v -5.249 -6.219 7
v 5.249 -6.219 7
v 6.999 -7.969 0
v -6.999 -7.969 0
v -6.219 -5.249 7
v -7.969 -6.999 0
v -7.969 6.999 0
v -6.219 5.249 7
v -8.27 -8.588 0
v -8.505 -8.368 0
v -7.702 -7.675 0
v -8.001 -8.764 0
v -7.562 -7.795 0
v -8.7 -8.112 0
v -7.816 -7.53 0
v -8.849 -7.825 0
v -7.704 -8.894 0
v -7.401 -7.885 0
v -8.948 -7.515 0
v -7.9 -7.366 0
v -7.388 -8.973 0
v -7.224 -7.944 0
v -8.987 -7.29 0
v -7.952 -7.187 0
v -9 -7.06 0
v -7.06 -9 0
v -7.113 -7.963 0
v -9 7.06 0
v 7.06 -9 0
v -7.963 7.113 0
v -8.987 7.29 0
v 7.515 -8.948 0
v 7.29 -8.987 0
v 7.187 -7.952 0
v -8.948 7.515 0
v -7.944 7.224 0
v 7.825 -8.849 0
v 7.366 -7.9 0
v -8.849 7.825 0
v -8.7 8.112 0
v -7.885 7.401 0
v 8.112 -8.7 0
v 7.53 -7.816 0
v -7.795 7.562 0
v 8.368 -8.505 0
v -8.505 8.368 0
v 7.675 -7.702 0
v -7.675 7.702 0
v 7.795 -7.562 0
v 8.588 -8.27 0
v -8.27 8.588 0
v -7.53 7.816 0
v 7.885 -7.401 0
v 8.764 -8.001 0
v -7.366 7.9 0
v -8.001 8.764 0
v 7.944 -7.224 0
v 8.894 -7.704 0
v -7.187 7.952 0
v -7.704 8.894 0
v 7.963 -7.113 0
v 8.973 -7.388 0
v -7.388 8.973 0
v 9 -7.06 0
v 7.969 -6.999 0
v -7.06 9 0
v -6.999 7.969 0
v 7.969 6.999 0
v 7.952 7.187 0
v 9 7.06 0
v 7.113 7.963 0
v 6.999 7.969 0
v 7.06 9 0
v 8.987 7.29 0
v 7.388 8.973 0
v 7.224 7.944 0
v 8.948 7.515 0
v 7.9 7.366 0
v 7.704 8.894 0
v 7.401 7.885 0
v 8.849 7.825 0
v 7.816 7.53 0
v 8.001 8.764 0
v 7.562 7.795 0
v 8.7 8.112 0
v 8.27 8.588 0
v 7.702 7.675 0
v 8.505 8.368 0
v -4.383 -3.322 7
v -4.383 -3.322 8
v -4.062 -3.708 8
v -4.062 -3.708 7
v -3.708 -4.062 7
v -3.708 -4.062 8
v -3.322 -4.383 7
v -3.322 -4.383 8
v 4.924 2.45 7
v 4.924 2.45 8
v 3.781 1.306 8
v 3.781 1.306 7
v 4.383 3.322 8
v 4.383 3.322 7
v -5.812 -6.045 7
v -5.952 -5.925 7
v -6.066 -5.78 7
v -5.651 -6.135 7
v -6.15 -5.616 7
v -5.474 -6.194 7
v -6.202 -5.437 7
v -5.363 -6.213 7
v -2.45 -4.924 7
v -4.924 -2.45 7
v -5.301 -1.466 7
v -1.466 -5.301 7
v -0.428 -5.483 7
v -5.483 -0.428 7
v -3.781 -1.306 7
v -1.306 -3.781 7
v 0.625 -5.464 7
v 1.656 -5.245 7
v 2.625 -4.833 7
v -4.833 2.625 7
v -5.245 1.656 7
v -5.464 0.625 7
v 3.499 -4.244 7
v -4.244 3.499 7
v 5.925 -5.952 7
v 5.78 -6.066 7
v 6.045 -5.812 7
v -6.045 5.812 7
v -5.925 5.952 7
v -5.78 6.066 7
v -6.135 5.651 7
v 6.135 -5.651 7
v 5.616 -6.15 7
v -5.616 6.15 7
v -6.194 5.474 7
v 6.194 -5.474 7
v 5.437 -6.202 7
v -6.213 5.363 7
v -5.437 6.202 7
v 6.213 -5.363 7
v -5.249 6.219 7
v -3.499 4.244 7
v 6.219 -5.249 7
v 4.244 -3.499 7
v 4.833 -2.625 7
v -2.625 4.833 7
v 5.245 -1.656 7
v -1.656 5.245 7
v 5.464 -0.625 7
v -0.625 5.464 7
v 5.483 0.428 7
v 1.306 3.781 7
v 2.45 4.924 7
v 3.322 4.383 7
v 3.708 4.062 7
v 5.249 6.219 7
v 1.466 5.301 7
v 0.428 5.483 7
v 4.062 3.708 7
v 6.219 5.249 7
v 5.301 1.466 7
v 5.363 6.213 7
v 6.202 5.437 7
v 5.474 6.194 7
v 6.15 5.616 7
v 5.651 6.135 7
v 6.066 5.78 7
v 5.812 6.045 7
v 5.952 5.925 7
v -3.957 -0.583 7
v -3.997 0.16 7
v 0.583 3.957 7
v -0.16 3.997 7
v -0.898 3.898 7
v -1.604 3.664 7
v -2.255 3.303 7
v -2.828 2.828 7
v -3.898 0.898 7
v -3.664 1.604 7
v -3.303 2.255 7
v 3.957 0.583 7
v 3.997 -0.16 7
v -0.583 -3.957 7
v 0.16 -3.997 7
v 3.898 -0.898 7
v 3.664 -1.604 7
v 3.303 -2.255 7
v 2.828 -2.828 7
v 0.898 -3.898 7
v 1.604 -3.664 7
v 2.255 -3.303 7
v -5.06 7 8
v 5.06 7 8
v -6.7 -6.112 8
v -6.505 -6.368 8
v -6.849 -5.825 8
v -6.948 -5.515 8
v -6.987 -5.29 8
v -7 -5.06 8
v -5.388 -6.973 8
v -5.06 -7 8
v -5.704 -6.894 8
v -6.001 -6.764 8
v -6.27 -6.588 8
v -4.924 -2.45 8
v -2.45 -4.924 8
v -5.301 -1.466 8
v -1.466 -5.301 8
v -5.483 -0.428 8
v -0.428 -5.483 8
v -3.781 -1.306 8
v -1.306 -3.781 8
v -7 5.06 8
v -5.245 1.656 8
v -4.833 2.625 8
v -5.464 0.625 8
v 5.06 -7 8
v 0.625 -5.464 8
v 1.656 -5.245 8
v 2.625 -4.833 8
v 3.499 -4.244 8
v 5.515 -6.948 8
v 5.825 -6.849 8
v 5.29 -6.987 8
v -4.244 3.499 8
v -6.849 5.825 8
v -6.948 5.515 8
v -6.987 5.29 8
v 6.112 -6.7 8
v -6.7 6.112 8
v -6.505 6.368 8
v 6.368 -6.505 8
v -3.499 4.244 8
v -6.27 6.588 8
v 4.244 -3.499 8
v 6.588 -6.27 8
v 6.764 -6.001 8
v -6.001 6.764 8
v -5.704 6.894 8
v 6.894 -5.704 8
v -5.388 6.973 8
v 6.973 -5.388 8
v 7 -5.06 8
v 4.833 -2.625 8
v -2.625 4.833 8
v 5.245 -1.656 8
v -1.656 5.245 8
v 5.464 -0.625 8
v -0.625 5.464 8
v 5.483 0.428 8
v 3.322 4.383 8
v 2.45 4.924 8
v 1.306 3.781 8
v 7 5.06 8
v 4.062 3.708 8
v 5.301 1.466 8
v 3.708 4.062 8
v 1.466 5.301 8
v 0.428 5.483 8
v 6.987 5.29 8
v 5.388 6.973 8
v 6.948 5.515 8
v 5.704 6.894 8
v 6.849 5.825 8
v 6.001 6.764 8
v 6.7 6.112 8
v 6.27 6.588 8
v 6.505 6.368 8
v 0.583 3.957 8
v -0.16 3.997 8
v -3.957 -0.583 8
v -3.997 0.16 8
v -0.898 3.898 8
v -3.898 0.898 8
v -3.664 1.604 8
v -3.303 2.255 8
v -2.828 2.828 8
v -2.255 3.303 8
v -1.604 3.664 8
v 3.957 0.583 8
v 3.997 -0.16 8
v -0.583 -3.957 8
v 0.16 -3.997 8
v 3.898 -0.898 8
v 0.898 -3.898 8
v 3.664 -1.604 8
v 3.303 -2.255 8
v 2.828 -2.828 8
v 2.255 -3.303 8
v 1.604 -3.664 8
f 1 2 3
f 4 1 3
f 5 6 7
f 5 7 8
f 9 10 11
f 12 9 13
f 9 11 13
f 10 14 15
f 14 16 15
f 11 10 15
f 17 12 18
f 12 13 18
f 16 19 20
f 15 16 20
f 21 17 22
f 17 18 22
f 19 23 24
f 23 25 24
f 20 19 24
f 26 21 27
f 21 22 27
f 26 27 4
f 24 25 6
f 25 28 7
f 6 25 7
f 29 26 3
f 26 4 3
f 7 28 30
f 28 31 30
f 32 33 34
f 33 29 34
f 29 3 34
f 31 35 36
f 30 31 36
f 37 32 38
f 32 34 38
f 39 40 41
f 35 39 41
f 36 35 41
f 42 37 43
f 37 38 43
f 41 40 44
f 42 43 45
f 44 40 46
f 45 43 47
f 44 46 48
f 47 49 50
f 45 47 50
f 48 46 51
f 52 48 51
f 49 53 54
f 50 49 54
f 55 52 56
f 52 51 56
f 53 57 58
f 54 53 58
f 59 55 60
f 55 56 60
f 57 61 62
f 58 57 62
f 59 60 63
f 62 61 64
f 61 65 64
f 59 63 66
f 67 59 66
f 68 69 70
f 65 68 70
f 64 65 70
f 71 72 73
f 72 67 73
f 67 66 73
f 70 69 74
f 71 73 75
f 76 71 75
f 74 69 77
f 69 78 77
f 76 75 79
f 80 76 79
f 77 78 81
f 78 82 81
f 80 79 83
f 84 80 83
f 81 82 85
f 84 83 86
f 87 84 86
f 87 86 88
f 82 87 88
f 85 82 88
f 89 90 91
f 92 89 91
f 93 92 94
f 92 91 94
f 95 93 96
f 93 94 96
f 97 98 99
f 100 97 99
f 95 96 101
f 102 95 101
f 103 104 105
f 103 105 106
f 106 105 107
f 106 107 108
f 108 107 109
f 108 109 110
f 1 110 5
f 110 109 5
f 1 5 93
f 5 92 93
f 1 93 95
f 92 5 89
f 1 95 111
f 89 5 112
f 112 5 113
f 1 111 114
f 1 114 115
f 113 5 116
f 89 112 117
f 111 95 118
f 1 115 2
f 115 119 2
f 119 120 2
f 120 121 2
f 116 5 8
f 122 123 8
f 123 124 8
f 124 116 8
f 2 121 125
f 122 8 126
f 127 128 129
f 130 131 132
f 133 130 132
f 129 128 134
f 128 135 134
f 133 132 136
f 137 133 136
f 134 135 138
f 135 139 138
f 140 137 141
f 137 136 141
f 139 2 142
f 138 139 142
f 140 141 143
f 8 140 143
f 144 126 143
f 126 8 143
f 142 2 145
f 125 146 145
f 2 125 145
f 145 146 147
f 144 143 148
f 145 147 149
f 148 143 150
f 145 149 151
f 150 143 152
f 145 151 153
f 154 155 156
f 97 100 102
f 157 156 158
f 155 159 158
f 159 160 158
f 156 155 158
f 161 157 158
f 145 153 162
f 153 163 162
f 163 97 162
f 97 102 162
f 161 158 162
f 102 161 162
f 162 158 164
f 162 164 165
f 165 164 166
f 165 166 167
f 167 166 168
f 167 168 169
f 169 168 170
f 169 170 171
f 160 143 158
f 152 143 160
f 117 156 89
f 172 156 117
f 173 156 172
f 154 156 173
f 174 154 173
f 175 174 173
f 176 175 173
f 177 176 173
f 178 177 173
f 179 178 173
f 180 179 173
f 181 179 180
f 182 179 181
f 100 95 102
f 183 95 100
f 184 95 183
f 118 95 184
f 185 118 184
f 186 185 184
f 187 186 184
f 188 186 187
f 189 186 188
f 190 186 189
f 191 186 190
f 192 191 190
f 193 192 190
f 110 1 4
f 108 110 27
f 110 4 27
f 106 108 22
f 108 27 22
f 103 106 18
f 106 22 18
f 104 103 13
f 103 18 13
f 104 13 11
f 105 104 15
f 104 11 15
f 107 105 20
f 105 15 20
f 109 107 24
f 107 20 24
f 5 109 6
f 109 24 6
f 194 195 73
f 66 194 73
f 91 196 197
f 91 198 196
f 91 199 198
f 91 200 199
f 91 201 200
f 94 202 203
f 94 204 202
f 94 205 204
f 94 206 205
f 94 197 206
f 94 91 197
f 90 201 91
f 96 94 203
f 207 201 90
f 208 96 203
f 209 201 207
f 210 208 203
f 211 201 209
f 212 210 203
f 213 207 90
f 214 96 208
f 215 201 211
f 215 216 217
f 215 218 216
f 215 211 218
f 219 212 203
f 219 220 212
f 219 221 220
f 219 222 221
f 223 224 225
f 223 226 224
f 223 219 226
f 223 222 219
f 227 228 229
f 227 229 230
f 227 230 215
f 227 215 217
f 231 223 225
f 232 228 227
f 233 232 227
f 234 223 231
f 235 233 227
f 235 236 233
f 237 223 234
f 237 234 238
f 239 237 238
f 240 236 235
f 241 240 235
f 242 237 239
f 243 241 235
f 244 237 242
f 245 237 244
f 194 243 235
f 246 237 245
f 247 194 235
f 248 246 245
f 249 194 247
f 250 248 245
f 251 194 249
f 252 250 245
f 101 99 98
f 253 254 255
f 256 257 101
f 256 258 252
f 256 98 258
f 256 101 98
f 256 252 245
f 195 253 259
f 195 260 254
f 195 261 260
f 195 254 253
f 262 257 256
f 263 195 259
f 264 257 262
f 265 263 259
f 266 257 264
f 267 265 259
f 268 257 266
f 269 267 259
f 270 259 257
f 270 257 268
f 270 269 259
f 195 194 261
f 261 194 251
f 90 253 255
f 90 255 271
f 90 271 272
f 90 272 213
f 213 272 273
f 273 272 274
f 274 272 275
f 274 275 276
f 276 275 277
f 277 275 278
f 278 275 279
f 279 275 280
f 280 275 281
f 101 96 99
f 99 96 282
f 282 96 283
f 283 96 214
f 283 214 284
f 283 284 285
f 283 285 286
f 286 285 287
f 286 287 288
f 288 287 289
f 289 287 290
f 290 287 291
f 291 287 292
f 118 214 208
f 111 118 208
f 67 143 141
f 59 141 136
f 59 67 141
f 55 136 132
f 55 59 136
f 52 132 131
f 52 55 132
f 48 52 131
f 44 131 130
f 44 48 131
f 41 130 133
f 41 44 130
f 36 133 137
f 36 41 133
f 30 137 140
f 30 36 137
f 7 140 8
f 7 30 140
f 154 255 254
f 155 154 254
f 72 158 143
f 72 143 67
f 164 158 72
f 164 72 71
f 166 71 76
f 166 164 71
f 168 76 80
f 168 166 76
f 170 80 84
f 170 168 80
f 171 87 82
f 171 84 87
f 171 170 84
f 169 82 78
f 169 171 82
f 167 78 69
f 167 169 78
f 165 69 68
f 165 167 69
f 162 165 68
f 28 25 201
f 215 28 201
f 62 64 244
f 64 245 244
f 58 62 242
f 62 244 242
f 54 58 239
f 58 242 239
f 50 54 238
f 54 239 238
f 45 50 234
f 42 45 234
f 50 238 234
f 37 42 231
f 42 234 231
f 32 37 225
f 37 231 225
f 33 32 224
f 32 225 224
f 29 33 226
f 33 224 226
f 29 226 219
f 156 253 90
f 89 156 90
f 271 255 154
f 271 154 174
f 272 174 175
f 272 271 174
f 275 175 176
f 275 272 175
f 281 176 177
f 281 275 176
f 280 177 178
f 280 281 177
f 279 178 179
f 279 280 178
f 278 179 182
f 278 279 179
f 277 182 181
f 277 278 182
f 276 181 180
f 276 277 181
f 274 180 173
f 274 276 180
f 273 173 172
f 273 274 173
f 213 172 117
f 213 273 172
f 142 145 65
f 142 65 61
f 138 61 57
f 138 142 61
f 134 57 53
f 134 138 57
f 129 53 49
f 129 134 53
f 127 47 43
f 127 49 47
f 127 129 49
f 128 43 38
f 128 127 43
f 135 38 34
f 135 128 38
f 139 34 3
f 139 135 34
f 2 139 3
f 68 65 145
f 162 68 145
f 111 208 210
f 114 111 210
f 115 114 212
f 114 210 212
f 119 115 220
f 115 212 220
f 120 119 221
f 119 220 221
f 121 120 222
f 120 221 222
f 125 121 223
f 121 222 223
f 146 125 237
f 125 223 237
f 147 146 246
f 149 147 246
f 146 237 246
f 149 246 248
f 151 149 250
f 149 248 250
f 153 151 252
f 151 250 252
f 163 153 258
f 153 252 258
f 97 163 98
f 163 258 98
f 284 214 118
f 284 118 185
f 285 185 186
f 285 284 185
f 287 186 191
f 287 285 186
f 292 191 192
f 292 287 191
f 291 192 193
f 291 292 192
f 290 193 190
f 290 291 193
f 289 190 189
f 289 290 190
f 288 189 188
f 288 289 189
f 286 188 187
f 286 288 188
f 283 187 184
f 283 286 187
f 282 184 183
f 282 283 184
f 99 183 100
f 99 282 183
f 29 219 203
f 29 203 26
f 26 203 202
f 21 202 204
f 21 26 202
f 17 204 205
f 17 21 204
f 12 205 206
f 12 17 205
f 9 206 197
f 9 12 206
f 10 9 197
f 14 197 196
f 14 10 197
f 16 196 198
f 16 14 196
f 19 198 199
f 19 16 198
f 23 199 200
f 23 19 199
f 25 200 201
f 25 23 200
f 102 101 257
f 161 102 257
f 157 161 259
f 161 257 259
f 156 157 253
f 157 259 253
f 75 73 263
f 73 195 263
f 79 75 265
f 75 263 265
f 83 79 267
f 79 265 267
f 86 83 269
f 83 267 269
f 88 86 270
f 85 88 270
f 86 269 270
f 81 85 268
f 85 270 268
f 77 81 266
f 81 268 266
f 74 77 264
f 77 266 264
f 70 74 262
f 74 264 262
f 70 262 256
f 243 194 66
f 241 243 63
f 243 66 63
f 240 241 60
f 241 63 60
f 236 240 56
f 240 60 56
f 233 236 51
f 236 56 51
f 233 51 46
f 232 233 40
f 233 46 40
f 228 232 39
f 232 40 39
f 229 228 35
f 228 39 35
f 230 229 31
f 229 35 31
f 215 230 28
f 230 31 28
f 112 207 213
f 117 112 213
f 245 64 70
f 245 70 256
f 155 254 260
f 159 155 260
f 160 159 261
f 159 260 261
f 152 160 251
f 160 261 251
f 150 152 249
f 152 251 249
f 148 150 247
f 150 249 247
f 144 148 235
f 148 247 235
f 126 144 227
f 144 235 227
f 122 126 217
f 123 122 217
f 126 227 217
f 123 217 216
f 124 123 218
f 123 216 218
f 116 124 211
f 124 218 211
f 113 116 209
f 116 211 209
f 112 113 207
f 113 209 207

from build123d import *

# Parameters (mm, degrees)
SKETCH_W             = 18
SKETCH_H             = 18
PAD_DEPTH            = 8
POCKET_DEPTH         = 18.001
POCKET001_DEPTH      = 9.001
POCKET001_DEPTH_BACK = 9.001
FILLET_R             = 2
THICKNESS_T          = -1
POCKET002_DEPTH      = 1


with BuildPart() as part:
    # Sketch → Pad (new body)
    with BuildSketch(Plane.XY):
        Rectangle(SKETCH_W, SKETCH_H)
    extrude(amount=PAD_DEPTH)

    # Sketch001 (on Face1 of Pad) → Pocket (cut, through all)
    with BuildSketch(Plane.XZ.offset(9)):
        Polygon((-9, 8), (-9, 0), (-7, 8), align=None)
        Polygon((9, 8), (9, 0), (7, 8), align=None)
    extrude(amount=-POCKET_DEPTH, mode=Mode.SUBTRACT)

    # Sketch002 → Pocket001 (cut, two sides)
    with BuildSketch(Plane.YZ) as pocket001_sk:
        Polygon((-9, 8), (-7, 8), (-9, 0), align=None)
        Polygon((9, 8), (7, 8), (9, 0), align=None)
    extrude(amount=-POCKET001_DEPTH, mode=Mode.SUBTRACT)
    extrude(pocket001_sk.sketch, amount=POCKET001_DEPTH_BACK, mode=Mode.SUBTRACT)

    # Fillet
    fillet_edges = [part.edges().sort_by_distance(p)[0] for p in [
        (-8, 8, 4),
        (-8, -8, 4),
        (8, -8, 4),
        (8, 8, 4),
    ]]
    fillet(fillet_edges, radius=FILLET_R)

    # Thickness
    thickness_openings = [part.faces().sort_by_distance(p)[0] for p in [
        (0, 0, 0),
    ]]
    offset(amount=THICKNESS_T, openings=thickness_openings, kind=Kind.INTERSECTION)

    # Sketch003 (on Face9 of Thickness) → Pocket002 (cut)
    with BuildSketch(Plane.XY.offset(8)):
        with BuildLine():
            ThreePointArc((-4.383089, -3.322429), (-3.889087, -3.889087), (-3.322429, -4.383089))
            Line((-3.322429, -4.383089), (4.383089, 3.322429))
            ThreePointArc((4.383089, 3.322429), (3.889087, 3.889087), (3.322429, 4.383089))
            Line((3.322429, 4.383089), (-4.383089, -3.322429))
        make_face()
        with BuildLine():
            ThreePointArc((-1.305937, -3.780811), (2.828427, -2.828427), (3.780811, 1.305937))
            Line((4.924407, 2.449533), (3.780811, 1.305937))
            ThreePointArc((-2.449533, -4.924407), (3.889087, -3.889087), (4.924407, 2.449533))
            Line((-1.305937, -3.780811), (-2.449533, -4.924407))
        make_face()
        with BuildLine():
            Line((-4.924407, -2.449533), (-3.780811, -1.305937))
            ThreePointArc((1.305937, 3.780811), (-2.828427, 2.828427), (-3.780811, -1.305937))
            Line((1.305937, 3.780811), (2.449533, 4.924407))
            ThreePointArc((2.449533, 4.924407), (-3.889087, 3.889087), (-4.924407, -2.449533))
        make_face()
    extrude(amount=-POCKET002_DEPTH, mode=Mode.SUBTRACT)


solid = part.part
